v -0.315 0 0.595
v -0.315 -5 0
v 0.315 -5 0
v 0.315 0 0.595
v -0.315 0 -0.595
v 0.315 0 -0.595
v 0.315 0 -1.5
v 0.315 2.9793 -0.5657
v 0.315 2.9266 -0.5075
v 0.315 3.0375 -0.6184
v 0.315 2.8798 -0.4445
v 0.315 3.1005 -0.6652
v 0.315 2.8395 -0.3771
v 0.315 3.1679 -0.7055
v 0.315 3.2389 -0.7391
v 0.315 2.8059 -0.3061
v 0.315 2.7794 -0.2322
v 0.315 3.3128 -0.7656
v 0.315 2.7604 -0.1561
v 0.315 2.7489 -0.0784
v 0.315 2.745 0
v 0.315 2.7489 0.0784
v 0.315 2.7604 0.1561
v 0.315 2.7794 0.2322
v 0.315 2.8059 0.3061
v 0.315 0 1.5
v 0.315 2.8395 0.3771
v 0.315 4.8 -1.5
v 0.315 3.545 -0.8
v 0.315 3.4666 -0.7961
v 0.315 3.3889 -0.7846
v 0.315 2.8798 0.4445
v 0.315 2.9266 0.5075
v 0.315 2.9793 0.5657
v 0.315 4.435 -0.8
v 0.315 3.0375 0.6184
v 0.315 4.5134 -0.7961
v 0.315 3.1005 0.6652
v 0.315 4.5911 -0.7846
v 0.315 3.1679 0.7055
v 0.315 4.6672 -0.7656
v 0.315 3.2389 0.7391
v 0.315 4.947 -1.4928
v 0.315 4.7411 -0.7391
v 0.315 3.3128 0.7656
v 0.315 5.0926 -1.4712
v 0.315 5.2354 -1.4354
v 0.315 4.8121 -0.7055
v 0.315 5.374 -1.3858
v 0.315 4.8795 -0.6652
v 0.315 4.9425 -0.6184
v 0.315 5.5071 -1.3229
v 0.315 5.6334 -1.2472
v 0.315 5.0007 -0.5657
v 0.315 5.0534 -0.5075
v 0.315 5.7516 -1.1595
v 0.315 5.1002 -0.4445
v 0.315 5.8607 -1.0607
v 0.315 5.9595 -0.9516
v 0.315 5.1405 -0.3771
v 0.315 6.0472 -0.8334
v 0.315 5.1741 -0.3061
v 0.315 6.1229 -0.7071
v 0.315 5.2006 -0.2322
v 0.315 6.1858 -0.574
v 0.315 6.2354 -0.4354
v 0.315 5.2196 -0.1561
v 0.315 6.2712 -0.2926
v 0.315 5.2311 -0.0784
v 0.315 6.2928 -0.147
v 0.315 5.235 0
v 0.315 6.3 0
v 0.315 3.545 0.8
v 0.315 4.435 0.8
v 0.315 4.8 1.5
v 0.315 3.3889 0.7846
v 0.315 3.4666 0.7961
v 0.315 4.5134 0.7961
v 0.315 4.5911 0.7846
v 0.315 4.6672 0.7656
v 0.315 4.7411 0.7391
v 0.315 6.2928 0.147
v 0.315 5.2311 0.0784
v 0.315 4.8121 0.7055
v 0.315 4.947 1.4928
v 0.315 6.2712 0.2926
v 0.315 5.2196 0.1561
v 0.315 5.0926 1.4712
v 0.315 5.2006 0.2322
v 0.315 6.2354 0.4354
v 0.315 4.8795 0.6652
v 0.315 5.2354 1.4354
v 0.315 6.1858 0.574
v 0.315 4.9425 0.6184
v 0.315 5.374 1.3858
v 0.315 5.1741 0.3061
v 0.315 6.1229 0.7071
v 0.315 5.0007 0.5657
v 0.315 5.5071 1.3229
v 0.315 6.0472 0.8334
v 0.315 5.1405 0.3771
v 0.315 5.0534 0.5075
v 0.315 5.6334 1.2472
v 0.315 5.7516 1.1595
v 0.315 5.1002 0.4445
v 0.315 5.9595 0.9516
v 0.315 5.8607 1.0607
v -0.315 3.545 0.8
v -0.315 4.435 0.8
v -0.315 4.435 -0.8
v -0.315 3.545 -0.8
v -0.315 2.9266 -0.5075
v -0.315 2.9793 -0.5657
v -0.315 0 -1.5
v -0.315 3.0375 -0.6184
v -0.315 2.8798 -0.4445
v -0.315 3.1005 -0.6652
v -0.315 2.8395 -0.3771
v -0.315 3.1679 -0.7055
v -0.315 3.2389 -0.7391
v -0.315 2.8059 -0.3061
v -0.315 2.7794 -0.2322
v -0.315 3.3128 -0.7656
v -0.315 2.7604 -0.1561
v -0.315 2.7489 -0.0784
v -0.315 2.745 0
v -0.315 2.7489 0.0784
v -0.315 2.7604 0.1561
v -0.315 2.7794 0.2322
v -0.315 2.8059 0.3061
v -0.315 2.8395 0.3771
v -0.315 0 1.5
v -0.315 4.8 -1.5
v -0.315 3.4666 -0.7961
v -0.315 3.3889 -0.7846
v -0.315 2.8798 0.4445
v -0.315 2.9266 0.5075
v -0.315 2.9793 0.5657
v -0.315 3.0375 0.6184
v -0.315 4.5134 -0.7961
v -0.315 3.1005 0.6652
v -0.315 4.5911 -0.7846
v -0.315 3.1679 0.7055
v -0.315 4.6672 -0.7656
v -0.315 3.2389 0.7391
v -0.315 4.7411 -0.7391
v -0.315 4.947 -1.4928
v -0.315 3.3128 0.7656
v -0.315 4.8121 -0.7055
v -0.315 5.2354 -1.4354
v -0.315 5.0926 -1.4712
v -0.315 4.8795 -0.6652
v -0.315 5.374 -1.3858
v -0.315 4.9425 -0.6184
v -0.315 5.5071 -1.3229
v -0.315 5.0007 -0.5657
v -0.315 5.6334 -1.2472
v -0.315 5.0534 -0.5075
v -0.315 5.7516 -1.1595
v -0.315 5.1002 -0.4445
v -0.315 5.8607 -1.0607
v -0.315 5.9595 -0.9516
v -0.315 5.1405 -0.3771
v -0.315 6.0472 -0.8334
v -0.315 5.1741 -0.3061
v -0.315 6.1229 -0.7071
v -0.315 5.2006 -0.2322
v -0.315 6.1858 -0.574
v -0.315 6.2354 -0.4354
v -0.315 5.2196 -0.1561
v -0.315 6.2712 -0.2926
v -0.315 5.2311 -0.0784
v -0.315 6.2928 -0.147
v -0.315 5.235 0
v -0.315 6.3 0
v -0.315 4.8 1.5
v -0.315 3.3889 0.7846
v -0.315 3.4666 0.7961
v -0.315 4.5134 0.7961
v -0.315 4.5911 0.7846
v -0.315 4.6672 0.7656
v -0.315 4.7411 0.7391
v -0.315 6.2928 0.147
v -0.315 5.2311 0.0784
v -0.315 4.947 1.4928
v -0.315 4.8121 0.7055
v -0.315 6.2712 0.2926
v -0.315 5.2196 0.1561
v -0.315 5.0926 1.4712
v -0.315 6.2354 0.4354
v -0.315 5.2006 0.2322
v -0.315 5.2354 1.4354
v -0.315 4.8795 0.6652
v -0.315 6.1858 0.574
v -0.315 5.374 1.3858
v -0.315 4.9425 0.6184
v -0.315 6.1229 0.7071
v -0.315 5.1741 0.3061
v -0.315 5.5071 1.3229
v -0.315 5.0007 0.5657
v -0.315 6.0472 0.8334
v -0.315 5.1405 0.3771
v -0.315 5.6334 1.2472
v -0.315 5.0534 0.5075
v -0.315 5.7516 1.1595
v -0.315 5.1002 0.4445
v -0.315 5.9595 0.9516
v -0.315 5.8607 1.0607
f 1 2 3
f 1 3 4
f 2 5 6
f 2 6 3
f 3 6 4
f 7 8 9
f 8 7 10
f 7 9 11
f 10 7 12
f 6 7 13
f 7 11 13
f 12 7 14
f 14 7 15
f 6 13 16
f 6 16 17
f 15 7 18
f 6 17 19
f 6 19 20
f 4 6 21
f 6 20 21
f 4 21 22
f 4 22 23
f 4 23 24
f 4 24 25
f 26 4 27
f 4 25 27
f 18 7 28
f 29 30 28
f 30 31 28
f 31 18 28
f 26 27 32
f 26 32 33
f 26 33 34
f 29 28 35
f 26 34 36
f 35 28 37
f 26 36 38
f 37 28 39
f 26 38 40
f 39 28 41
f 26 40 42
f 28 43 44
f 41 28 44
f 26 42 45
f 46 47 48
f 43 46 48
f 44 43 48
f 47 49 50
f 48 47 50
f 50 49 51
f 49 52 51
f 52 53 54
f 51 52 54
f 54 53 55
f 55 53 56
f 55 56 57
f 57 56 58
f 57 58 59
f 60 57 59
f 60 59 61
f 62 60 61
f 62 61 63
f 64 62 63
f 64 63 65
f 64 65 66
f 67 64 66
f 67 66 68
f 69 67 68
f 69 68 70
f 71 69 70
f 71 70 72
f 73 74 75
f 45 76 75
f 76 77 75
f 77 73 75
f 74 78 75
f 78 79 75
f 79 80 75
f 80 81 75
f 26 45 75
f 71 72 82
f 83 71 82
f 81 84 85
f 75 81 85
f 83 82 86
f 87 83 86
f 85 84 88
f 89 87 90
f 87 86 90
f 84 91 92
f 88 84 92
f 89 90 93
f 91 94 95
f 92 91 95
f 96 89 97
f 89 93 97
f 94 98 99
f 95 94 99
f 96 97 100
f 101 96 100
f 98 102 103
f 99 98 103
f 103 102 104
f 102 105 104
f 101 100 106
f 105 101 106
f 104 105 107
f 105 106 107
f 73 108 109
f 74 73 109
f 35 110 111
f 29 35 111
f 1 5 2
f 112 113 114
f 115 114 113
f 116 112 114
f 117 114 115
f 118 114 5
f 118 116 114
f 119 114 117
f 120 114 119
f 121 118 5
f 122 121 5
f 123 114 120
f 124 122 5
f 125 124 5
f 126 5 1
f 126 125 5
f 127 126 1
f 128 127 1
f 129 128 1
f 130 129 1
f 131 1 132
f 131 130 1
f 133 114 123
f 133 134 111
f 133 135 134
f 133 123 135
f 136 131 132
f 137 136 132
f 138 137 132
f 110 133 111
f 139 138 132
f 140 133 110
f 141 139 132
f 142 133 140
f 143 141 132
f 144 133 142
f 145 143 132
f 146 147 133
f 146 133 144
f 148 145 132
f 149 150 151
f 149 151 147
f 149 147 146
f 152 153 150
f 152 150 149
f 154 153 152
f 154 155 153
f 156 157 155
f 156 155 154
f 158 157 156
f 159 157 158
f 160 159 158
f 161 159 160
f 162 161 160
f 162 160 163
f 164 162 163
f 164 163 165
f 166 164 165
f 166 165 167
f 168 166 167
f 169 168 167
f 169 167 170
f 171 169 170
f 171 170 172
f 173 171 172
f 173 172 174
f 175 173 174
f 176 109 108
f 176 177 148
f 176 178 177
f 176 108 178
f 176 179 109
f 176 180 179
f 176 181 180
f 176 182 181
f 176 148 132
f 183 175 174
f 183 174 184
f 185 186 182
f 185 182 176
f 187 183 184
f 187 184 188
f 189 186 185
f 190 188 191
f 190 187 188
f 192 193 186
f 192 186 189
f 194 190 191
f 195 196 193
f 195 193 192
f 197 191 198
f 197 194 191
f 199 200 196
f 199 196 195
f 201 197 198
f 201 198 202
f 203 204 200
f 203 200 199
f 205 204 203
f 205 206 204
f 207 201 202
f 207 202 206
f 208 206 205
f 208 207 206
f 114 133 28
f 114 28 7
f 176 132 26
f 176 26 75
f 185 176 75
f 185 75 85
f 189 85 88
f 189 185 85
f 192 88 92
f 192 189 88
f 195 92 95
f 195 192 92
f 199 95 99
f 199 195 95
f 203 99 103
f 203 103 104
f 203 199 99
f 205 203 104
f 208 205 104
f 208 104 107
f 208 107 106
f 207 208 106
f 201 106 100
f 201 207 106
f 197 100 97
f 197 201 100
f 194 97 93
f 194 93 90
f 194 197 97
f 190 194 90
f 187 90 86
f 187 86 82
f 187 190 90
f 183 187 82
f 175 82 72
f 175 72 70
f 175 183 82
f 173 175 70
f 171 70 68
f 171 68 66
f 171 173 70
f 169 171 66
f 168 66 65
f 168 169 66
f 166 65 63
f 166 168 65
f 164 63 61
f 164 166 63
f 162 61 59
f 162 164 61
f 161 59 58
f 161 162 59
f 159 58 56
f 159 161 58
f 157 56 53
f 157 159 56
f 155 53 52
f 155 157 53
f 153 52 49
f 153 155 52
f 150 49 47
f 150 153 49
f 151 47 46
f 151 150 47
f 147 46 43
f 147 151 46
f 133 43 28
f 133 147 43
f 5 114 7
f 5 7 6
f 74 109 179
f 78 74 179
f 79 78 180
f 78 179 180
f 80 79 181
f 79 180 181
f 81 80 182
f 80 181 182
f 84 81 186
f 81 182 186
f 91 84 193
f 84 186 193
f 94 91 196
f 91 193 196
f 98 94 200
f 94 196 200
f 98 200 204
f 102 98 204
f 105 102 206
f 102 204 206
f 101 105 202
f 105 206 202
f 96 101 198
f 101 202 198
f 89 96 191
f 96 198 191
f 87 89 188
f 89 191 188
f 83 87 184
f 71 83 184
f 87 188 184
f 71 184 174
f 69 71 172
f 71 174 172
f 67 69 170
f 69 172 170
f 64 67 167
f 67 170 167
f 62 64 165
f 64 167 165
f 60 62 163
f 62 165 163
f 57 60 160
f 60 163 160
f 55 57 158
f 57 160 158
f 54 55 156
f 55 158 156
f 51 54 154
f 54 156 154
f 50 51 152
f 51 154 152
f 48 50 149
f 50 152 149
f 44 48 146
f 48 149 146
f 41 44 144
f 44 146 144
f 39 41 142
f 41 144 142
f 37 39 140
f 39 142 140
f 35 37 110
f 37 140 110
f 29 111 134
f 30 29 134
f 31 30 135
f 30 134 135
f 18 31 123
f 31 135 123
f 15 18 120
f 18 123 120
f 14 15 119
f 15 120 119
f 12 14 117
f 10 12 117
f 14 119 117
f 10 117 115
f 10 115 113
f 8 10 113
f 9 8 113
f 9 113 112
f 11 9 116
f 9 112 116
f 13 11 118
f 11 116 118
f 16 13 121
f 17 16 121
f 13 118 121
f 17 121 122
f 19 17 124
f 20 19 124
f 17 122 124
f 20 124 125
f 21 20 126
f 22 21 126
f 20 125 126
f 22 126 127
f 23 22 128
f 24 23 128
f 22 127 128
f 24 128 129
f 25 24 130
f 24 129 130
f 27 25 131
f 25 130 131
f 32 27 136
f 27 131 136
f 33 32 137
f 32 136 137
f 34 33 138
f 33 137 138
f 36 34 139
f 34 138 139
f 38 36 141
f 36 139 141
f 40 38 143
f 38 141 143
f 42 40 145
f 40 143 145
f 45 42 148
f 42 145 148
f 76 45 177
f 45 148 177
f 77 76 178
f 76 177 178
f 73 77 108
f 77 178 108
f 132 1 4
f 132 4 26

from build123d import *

# Parameters (mm, degrees)
BOSS_EXTRUDE1_DEPTH      = 0.315
BOSS_EXTRUDE1_DEPTH_BACK = 0.315


with BuildPart() as part:
    # Sketch2 → Boss-Extrude1 (new, two sides: drawn at the far end of the back side and taken through both)
    with BuildSketch(Plane(origin=(0, 0, 0), x_dir=(0, 0, -1), z_dir=(1, 0, 0)).offset(-BOSS_EXTRUDE1_DEPTH_BACK)):
        with BuildLine():
            Line((1.5, 0), (0.595, 0))
            Line((0.595, 0), (0, -5))
            Line((0, -5), (-0.595, 0))
            Line((-0.595, 0), (-1.5, 0))
            Line((-1.5, 0), (-1.5, 4.8))
            ThreePointArc((-1.5, 4.8), (0, 6.3), (1.5, 4.8))
            Line((1.5, 4.8), (1.5, 0))
        make_face()
        with BuildLine():
            Line((-0.8, 3.545), (-0.8, 4.435))
            ThreePointArc((-0.8, 4.435), (0, 5.235), (0.8, 4.435))
            Line((0.8, 4.435), (0.8, 3.545))
            ThreePointArc((0.8, 3.545), (0, 2.745), (-0.8, 3.545))
        make_face(mode=Mode.SUBTRACT)
    extrude(amount=BOSS_EXTRUDE1_DEPTH + BOSS_EXTRUDE1_DEPTH_BACK)


solid = part.part
